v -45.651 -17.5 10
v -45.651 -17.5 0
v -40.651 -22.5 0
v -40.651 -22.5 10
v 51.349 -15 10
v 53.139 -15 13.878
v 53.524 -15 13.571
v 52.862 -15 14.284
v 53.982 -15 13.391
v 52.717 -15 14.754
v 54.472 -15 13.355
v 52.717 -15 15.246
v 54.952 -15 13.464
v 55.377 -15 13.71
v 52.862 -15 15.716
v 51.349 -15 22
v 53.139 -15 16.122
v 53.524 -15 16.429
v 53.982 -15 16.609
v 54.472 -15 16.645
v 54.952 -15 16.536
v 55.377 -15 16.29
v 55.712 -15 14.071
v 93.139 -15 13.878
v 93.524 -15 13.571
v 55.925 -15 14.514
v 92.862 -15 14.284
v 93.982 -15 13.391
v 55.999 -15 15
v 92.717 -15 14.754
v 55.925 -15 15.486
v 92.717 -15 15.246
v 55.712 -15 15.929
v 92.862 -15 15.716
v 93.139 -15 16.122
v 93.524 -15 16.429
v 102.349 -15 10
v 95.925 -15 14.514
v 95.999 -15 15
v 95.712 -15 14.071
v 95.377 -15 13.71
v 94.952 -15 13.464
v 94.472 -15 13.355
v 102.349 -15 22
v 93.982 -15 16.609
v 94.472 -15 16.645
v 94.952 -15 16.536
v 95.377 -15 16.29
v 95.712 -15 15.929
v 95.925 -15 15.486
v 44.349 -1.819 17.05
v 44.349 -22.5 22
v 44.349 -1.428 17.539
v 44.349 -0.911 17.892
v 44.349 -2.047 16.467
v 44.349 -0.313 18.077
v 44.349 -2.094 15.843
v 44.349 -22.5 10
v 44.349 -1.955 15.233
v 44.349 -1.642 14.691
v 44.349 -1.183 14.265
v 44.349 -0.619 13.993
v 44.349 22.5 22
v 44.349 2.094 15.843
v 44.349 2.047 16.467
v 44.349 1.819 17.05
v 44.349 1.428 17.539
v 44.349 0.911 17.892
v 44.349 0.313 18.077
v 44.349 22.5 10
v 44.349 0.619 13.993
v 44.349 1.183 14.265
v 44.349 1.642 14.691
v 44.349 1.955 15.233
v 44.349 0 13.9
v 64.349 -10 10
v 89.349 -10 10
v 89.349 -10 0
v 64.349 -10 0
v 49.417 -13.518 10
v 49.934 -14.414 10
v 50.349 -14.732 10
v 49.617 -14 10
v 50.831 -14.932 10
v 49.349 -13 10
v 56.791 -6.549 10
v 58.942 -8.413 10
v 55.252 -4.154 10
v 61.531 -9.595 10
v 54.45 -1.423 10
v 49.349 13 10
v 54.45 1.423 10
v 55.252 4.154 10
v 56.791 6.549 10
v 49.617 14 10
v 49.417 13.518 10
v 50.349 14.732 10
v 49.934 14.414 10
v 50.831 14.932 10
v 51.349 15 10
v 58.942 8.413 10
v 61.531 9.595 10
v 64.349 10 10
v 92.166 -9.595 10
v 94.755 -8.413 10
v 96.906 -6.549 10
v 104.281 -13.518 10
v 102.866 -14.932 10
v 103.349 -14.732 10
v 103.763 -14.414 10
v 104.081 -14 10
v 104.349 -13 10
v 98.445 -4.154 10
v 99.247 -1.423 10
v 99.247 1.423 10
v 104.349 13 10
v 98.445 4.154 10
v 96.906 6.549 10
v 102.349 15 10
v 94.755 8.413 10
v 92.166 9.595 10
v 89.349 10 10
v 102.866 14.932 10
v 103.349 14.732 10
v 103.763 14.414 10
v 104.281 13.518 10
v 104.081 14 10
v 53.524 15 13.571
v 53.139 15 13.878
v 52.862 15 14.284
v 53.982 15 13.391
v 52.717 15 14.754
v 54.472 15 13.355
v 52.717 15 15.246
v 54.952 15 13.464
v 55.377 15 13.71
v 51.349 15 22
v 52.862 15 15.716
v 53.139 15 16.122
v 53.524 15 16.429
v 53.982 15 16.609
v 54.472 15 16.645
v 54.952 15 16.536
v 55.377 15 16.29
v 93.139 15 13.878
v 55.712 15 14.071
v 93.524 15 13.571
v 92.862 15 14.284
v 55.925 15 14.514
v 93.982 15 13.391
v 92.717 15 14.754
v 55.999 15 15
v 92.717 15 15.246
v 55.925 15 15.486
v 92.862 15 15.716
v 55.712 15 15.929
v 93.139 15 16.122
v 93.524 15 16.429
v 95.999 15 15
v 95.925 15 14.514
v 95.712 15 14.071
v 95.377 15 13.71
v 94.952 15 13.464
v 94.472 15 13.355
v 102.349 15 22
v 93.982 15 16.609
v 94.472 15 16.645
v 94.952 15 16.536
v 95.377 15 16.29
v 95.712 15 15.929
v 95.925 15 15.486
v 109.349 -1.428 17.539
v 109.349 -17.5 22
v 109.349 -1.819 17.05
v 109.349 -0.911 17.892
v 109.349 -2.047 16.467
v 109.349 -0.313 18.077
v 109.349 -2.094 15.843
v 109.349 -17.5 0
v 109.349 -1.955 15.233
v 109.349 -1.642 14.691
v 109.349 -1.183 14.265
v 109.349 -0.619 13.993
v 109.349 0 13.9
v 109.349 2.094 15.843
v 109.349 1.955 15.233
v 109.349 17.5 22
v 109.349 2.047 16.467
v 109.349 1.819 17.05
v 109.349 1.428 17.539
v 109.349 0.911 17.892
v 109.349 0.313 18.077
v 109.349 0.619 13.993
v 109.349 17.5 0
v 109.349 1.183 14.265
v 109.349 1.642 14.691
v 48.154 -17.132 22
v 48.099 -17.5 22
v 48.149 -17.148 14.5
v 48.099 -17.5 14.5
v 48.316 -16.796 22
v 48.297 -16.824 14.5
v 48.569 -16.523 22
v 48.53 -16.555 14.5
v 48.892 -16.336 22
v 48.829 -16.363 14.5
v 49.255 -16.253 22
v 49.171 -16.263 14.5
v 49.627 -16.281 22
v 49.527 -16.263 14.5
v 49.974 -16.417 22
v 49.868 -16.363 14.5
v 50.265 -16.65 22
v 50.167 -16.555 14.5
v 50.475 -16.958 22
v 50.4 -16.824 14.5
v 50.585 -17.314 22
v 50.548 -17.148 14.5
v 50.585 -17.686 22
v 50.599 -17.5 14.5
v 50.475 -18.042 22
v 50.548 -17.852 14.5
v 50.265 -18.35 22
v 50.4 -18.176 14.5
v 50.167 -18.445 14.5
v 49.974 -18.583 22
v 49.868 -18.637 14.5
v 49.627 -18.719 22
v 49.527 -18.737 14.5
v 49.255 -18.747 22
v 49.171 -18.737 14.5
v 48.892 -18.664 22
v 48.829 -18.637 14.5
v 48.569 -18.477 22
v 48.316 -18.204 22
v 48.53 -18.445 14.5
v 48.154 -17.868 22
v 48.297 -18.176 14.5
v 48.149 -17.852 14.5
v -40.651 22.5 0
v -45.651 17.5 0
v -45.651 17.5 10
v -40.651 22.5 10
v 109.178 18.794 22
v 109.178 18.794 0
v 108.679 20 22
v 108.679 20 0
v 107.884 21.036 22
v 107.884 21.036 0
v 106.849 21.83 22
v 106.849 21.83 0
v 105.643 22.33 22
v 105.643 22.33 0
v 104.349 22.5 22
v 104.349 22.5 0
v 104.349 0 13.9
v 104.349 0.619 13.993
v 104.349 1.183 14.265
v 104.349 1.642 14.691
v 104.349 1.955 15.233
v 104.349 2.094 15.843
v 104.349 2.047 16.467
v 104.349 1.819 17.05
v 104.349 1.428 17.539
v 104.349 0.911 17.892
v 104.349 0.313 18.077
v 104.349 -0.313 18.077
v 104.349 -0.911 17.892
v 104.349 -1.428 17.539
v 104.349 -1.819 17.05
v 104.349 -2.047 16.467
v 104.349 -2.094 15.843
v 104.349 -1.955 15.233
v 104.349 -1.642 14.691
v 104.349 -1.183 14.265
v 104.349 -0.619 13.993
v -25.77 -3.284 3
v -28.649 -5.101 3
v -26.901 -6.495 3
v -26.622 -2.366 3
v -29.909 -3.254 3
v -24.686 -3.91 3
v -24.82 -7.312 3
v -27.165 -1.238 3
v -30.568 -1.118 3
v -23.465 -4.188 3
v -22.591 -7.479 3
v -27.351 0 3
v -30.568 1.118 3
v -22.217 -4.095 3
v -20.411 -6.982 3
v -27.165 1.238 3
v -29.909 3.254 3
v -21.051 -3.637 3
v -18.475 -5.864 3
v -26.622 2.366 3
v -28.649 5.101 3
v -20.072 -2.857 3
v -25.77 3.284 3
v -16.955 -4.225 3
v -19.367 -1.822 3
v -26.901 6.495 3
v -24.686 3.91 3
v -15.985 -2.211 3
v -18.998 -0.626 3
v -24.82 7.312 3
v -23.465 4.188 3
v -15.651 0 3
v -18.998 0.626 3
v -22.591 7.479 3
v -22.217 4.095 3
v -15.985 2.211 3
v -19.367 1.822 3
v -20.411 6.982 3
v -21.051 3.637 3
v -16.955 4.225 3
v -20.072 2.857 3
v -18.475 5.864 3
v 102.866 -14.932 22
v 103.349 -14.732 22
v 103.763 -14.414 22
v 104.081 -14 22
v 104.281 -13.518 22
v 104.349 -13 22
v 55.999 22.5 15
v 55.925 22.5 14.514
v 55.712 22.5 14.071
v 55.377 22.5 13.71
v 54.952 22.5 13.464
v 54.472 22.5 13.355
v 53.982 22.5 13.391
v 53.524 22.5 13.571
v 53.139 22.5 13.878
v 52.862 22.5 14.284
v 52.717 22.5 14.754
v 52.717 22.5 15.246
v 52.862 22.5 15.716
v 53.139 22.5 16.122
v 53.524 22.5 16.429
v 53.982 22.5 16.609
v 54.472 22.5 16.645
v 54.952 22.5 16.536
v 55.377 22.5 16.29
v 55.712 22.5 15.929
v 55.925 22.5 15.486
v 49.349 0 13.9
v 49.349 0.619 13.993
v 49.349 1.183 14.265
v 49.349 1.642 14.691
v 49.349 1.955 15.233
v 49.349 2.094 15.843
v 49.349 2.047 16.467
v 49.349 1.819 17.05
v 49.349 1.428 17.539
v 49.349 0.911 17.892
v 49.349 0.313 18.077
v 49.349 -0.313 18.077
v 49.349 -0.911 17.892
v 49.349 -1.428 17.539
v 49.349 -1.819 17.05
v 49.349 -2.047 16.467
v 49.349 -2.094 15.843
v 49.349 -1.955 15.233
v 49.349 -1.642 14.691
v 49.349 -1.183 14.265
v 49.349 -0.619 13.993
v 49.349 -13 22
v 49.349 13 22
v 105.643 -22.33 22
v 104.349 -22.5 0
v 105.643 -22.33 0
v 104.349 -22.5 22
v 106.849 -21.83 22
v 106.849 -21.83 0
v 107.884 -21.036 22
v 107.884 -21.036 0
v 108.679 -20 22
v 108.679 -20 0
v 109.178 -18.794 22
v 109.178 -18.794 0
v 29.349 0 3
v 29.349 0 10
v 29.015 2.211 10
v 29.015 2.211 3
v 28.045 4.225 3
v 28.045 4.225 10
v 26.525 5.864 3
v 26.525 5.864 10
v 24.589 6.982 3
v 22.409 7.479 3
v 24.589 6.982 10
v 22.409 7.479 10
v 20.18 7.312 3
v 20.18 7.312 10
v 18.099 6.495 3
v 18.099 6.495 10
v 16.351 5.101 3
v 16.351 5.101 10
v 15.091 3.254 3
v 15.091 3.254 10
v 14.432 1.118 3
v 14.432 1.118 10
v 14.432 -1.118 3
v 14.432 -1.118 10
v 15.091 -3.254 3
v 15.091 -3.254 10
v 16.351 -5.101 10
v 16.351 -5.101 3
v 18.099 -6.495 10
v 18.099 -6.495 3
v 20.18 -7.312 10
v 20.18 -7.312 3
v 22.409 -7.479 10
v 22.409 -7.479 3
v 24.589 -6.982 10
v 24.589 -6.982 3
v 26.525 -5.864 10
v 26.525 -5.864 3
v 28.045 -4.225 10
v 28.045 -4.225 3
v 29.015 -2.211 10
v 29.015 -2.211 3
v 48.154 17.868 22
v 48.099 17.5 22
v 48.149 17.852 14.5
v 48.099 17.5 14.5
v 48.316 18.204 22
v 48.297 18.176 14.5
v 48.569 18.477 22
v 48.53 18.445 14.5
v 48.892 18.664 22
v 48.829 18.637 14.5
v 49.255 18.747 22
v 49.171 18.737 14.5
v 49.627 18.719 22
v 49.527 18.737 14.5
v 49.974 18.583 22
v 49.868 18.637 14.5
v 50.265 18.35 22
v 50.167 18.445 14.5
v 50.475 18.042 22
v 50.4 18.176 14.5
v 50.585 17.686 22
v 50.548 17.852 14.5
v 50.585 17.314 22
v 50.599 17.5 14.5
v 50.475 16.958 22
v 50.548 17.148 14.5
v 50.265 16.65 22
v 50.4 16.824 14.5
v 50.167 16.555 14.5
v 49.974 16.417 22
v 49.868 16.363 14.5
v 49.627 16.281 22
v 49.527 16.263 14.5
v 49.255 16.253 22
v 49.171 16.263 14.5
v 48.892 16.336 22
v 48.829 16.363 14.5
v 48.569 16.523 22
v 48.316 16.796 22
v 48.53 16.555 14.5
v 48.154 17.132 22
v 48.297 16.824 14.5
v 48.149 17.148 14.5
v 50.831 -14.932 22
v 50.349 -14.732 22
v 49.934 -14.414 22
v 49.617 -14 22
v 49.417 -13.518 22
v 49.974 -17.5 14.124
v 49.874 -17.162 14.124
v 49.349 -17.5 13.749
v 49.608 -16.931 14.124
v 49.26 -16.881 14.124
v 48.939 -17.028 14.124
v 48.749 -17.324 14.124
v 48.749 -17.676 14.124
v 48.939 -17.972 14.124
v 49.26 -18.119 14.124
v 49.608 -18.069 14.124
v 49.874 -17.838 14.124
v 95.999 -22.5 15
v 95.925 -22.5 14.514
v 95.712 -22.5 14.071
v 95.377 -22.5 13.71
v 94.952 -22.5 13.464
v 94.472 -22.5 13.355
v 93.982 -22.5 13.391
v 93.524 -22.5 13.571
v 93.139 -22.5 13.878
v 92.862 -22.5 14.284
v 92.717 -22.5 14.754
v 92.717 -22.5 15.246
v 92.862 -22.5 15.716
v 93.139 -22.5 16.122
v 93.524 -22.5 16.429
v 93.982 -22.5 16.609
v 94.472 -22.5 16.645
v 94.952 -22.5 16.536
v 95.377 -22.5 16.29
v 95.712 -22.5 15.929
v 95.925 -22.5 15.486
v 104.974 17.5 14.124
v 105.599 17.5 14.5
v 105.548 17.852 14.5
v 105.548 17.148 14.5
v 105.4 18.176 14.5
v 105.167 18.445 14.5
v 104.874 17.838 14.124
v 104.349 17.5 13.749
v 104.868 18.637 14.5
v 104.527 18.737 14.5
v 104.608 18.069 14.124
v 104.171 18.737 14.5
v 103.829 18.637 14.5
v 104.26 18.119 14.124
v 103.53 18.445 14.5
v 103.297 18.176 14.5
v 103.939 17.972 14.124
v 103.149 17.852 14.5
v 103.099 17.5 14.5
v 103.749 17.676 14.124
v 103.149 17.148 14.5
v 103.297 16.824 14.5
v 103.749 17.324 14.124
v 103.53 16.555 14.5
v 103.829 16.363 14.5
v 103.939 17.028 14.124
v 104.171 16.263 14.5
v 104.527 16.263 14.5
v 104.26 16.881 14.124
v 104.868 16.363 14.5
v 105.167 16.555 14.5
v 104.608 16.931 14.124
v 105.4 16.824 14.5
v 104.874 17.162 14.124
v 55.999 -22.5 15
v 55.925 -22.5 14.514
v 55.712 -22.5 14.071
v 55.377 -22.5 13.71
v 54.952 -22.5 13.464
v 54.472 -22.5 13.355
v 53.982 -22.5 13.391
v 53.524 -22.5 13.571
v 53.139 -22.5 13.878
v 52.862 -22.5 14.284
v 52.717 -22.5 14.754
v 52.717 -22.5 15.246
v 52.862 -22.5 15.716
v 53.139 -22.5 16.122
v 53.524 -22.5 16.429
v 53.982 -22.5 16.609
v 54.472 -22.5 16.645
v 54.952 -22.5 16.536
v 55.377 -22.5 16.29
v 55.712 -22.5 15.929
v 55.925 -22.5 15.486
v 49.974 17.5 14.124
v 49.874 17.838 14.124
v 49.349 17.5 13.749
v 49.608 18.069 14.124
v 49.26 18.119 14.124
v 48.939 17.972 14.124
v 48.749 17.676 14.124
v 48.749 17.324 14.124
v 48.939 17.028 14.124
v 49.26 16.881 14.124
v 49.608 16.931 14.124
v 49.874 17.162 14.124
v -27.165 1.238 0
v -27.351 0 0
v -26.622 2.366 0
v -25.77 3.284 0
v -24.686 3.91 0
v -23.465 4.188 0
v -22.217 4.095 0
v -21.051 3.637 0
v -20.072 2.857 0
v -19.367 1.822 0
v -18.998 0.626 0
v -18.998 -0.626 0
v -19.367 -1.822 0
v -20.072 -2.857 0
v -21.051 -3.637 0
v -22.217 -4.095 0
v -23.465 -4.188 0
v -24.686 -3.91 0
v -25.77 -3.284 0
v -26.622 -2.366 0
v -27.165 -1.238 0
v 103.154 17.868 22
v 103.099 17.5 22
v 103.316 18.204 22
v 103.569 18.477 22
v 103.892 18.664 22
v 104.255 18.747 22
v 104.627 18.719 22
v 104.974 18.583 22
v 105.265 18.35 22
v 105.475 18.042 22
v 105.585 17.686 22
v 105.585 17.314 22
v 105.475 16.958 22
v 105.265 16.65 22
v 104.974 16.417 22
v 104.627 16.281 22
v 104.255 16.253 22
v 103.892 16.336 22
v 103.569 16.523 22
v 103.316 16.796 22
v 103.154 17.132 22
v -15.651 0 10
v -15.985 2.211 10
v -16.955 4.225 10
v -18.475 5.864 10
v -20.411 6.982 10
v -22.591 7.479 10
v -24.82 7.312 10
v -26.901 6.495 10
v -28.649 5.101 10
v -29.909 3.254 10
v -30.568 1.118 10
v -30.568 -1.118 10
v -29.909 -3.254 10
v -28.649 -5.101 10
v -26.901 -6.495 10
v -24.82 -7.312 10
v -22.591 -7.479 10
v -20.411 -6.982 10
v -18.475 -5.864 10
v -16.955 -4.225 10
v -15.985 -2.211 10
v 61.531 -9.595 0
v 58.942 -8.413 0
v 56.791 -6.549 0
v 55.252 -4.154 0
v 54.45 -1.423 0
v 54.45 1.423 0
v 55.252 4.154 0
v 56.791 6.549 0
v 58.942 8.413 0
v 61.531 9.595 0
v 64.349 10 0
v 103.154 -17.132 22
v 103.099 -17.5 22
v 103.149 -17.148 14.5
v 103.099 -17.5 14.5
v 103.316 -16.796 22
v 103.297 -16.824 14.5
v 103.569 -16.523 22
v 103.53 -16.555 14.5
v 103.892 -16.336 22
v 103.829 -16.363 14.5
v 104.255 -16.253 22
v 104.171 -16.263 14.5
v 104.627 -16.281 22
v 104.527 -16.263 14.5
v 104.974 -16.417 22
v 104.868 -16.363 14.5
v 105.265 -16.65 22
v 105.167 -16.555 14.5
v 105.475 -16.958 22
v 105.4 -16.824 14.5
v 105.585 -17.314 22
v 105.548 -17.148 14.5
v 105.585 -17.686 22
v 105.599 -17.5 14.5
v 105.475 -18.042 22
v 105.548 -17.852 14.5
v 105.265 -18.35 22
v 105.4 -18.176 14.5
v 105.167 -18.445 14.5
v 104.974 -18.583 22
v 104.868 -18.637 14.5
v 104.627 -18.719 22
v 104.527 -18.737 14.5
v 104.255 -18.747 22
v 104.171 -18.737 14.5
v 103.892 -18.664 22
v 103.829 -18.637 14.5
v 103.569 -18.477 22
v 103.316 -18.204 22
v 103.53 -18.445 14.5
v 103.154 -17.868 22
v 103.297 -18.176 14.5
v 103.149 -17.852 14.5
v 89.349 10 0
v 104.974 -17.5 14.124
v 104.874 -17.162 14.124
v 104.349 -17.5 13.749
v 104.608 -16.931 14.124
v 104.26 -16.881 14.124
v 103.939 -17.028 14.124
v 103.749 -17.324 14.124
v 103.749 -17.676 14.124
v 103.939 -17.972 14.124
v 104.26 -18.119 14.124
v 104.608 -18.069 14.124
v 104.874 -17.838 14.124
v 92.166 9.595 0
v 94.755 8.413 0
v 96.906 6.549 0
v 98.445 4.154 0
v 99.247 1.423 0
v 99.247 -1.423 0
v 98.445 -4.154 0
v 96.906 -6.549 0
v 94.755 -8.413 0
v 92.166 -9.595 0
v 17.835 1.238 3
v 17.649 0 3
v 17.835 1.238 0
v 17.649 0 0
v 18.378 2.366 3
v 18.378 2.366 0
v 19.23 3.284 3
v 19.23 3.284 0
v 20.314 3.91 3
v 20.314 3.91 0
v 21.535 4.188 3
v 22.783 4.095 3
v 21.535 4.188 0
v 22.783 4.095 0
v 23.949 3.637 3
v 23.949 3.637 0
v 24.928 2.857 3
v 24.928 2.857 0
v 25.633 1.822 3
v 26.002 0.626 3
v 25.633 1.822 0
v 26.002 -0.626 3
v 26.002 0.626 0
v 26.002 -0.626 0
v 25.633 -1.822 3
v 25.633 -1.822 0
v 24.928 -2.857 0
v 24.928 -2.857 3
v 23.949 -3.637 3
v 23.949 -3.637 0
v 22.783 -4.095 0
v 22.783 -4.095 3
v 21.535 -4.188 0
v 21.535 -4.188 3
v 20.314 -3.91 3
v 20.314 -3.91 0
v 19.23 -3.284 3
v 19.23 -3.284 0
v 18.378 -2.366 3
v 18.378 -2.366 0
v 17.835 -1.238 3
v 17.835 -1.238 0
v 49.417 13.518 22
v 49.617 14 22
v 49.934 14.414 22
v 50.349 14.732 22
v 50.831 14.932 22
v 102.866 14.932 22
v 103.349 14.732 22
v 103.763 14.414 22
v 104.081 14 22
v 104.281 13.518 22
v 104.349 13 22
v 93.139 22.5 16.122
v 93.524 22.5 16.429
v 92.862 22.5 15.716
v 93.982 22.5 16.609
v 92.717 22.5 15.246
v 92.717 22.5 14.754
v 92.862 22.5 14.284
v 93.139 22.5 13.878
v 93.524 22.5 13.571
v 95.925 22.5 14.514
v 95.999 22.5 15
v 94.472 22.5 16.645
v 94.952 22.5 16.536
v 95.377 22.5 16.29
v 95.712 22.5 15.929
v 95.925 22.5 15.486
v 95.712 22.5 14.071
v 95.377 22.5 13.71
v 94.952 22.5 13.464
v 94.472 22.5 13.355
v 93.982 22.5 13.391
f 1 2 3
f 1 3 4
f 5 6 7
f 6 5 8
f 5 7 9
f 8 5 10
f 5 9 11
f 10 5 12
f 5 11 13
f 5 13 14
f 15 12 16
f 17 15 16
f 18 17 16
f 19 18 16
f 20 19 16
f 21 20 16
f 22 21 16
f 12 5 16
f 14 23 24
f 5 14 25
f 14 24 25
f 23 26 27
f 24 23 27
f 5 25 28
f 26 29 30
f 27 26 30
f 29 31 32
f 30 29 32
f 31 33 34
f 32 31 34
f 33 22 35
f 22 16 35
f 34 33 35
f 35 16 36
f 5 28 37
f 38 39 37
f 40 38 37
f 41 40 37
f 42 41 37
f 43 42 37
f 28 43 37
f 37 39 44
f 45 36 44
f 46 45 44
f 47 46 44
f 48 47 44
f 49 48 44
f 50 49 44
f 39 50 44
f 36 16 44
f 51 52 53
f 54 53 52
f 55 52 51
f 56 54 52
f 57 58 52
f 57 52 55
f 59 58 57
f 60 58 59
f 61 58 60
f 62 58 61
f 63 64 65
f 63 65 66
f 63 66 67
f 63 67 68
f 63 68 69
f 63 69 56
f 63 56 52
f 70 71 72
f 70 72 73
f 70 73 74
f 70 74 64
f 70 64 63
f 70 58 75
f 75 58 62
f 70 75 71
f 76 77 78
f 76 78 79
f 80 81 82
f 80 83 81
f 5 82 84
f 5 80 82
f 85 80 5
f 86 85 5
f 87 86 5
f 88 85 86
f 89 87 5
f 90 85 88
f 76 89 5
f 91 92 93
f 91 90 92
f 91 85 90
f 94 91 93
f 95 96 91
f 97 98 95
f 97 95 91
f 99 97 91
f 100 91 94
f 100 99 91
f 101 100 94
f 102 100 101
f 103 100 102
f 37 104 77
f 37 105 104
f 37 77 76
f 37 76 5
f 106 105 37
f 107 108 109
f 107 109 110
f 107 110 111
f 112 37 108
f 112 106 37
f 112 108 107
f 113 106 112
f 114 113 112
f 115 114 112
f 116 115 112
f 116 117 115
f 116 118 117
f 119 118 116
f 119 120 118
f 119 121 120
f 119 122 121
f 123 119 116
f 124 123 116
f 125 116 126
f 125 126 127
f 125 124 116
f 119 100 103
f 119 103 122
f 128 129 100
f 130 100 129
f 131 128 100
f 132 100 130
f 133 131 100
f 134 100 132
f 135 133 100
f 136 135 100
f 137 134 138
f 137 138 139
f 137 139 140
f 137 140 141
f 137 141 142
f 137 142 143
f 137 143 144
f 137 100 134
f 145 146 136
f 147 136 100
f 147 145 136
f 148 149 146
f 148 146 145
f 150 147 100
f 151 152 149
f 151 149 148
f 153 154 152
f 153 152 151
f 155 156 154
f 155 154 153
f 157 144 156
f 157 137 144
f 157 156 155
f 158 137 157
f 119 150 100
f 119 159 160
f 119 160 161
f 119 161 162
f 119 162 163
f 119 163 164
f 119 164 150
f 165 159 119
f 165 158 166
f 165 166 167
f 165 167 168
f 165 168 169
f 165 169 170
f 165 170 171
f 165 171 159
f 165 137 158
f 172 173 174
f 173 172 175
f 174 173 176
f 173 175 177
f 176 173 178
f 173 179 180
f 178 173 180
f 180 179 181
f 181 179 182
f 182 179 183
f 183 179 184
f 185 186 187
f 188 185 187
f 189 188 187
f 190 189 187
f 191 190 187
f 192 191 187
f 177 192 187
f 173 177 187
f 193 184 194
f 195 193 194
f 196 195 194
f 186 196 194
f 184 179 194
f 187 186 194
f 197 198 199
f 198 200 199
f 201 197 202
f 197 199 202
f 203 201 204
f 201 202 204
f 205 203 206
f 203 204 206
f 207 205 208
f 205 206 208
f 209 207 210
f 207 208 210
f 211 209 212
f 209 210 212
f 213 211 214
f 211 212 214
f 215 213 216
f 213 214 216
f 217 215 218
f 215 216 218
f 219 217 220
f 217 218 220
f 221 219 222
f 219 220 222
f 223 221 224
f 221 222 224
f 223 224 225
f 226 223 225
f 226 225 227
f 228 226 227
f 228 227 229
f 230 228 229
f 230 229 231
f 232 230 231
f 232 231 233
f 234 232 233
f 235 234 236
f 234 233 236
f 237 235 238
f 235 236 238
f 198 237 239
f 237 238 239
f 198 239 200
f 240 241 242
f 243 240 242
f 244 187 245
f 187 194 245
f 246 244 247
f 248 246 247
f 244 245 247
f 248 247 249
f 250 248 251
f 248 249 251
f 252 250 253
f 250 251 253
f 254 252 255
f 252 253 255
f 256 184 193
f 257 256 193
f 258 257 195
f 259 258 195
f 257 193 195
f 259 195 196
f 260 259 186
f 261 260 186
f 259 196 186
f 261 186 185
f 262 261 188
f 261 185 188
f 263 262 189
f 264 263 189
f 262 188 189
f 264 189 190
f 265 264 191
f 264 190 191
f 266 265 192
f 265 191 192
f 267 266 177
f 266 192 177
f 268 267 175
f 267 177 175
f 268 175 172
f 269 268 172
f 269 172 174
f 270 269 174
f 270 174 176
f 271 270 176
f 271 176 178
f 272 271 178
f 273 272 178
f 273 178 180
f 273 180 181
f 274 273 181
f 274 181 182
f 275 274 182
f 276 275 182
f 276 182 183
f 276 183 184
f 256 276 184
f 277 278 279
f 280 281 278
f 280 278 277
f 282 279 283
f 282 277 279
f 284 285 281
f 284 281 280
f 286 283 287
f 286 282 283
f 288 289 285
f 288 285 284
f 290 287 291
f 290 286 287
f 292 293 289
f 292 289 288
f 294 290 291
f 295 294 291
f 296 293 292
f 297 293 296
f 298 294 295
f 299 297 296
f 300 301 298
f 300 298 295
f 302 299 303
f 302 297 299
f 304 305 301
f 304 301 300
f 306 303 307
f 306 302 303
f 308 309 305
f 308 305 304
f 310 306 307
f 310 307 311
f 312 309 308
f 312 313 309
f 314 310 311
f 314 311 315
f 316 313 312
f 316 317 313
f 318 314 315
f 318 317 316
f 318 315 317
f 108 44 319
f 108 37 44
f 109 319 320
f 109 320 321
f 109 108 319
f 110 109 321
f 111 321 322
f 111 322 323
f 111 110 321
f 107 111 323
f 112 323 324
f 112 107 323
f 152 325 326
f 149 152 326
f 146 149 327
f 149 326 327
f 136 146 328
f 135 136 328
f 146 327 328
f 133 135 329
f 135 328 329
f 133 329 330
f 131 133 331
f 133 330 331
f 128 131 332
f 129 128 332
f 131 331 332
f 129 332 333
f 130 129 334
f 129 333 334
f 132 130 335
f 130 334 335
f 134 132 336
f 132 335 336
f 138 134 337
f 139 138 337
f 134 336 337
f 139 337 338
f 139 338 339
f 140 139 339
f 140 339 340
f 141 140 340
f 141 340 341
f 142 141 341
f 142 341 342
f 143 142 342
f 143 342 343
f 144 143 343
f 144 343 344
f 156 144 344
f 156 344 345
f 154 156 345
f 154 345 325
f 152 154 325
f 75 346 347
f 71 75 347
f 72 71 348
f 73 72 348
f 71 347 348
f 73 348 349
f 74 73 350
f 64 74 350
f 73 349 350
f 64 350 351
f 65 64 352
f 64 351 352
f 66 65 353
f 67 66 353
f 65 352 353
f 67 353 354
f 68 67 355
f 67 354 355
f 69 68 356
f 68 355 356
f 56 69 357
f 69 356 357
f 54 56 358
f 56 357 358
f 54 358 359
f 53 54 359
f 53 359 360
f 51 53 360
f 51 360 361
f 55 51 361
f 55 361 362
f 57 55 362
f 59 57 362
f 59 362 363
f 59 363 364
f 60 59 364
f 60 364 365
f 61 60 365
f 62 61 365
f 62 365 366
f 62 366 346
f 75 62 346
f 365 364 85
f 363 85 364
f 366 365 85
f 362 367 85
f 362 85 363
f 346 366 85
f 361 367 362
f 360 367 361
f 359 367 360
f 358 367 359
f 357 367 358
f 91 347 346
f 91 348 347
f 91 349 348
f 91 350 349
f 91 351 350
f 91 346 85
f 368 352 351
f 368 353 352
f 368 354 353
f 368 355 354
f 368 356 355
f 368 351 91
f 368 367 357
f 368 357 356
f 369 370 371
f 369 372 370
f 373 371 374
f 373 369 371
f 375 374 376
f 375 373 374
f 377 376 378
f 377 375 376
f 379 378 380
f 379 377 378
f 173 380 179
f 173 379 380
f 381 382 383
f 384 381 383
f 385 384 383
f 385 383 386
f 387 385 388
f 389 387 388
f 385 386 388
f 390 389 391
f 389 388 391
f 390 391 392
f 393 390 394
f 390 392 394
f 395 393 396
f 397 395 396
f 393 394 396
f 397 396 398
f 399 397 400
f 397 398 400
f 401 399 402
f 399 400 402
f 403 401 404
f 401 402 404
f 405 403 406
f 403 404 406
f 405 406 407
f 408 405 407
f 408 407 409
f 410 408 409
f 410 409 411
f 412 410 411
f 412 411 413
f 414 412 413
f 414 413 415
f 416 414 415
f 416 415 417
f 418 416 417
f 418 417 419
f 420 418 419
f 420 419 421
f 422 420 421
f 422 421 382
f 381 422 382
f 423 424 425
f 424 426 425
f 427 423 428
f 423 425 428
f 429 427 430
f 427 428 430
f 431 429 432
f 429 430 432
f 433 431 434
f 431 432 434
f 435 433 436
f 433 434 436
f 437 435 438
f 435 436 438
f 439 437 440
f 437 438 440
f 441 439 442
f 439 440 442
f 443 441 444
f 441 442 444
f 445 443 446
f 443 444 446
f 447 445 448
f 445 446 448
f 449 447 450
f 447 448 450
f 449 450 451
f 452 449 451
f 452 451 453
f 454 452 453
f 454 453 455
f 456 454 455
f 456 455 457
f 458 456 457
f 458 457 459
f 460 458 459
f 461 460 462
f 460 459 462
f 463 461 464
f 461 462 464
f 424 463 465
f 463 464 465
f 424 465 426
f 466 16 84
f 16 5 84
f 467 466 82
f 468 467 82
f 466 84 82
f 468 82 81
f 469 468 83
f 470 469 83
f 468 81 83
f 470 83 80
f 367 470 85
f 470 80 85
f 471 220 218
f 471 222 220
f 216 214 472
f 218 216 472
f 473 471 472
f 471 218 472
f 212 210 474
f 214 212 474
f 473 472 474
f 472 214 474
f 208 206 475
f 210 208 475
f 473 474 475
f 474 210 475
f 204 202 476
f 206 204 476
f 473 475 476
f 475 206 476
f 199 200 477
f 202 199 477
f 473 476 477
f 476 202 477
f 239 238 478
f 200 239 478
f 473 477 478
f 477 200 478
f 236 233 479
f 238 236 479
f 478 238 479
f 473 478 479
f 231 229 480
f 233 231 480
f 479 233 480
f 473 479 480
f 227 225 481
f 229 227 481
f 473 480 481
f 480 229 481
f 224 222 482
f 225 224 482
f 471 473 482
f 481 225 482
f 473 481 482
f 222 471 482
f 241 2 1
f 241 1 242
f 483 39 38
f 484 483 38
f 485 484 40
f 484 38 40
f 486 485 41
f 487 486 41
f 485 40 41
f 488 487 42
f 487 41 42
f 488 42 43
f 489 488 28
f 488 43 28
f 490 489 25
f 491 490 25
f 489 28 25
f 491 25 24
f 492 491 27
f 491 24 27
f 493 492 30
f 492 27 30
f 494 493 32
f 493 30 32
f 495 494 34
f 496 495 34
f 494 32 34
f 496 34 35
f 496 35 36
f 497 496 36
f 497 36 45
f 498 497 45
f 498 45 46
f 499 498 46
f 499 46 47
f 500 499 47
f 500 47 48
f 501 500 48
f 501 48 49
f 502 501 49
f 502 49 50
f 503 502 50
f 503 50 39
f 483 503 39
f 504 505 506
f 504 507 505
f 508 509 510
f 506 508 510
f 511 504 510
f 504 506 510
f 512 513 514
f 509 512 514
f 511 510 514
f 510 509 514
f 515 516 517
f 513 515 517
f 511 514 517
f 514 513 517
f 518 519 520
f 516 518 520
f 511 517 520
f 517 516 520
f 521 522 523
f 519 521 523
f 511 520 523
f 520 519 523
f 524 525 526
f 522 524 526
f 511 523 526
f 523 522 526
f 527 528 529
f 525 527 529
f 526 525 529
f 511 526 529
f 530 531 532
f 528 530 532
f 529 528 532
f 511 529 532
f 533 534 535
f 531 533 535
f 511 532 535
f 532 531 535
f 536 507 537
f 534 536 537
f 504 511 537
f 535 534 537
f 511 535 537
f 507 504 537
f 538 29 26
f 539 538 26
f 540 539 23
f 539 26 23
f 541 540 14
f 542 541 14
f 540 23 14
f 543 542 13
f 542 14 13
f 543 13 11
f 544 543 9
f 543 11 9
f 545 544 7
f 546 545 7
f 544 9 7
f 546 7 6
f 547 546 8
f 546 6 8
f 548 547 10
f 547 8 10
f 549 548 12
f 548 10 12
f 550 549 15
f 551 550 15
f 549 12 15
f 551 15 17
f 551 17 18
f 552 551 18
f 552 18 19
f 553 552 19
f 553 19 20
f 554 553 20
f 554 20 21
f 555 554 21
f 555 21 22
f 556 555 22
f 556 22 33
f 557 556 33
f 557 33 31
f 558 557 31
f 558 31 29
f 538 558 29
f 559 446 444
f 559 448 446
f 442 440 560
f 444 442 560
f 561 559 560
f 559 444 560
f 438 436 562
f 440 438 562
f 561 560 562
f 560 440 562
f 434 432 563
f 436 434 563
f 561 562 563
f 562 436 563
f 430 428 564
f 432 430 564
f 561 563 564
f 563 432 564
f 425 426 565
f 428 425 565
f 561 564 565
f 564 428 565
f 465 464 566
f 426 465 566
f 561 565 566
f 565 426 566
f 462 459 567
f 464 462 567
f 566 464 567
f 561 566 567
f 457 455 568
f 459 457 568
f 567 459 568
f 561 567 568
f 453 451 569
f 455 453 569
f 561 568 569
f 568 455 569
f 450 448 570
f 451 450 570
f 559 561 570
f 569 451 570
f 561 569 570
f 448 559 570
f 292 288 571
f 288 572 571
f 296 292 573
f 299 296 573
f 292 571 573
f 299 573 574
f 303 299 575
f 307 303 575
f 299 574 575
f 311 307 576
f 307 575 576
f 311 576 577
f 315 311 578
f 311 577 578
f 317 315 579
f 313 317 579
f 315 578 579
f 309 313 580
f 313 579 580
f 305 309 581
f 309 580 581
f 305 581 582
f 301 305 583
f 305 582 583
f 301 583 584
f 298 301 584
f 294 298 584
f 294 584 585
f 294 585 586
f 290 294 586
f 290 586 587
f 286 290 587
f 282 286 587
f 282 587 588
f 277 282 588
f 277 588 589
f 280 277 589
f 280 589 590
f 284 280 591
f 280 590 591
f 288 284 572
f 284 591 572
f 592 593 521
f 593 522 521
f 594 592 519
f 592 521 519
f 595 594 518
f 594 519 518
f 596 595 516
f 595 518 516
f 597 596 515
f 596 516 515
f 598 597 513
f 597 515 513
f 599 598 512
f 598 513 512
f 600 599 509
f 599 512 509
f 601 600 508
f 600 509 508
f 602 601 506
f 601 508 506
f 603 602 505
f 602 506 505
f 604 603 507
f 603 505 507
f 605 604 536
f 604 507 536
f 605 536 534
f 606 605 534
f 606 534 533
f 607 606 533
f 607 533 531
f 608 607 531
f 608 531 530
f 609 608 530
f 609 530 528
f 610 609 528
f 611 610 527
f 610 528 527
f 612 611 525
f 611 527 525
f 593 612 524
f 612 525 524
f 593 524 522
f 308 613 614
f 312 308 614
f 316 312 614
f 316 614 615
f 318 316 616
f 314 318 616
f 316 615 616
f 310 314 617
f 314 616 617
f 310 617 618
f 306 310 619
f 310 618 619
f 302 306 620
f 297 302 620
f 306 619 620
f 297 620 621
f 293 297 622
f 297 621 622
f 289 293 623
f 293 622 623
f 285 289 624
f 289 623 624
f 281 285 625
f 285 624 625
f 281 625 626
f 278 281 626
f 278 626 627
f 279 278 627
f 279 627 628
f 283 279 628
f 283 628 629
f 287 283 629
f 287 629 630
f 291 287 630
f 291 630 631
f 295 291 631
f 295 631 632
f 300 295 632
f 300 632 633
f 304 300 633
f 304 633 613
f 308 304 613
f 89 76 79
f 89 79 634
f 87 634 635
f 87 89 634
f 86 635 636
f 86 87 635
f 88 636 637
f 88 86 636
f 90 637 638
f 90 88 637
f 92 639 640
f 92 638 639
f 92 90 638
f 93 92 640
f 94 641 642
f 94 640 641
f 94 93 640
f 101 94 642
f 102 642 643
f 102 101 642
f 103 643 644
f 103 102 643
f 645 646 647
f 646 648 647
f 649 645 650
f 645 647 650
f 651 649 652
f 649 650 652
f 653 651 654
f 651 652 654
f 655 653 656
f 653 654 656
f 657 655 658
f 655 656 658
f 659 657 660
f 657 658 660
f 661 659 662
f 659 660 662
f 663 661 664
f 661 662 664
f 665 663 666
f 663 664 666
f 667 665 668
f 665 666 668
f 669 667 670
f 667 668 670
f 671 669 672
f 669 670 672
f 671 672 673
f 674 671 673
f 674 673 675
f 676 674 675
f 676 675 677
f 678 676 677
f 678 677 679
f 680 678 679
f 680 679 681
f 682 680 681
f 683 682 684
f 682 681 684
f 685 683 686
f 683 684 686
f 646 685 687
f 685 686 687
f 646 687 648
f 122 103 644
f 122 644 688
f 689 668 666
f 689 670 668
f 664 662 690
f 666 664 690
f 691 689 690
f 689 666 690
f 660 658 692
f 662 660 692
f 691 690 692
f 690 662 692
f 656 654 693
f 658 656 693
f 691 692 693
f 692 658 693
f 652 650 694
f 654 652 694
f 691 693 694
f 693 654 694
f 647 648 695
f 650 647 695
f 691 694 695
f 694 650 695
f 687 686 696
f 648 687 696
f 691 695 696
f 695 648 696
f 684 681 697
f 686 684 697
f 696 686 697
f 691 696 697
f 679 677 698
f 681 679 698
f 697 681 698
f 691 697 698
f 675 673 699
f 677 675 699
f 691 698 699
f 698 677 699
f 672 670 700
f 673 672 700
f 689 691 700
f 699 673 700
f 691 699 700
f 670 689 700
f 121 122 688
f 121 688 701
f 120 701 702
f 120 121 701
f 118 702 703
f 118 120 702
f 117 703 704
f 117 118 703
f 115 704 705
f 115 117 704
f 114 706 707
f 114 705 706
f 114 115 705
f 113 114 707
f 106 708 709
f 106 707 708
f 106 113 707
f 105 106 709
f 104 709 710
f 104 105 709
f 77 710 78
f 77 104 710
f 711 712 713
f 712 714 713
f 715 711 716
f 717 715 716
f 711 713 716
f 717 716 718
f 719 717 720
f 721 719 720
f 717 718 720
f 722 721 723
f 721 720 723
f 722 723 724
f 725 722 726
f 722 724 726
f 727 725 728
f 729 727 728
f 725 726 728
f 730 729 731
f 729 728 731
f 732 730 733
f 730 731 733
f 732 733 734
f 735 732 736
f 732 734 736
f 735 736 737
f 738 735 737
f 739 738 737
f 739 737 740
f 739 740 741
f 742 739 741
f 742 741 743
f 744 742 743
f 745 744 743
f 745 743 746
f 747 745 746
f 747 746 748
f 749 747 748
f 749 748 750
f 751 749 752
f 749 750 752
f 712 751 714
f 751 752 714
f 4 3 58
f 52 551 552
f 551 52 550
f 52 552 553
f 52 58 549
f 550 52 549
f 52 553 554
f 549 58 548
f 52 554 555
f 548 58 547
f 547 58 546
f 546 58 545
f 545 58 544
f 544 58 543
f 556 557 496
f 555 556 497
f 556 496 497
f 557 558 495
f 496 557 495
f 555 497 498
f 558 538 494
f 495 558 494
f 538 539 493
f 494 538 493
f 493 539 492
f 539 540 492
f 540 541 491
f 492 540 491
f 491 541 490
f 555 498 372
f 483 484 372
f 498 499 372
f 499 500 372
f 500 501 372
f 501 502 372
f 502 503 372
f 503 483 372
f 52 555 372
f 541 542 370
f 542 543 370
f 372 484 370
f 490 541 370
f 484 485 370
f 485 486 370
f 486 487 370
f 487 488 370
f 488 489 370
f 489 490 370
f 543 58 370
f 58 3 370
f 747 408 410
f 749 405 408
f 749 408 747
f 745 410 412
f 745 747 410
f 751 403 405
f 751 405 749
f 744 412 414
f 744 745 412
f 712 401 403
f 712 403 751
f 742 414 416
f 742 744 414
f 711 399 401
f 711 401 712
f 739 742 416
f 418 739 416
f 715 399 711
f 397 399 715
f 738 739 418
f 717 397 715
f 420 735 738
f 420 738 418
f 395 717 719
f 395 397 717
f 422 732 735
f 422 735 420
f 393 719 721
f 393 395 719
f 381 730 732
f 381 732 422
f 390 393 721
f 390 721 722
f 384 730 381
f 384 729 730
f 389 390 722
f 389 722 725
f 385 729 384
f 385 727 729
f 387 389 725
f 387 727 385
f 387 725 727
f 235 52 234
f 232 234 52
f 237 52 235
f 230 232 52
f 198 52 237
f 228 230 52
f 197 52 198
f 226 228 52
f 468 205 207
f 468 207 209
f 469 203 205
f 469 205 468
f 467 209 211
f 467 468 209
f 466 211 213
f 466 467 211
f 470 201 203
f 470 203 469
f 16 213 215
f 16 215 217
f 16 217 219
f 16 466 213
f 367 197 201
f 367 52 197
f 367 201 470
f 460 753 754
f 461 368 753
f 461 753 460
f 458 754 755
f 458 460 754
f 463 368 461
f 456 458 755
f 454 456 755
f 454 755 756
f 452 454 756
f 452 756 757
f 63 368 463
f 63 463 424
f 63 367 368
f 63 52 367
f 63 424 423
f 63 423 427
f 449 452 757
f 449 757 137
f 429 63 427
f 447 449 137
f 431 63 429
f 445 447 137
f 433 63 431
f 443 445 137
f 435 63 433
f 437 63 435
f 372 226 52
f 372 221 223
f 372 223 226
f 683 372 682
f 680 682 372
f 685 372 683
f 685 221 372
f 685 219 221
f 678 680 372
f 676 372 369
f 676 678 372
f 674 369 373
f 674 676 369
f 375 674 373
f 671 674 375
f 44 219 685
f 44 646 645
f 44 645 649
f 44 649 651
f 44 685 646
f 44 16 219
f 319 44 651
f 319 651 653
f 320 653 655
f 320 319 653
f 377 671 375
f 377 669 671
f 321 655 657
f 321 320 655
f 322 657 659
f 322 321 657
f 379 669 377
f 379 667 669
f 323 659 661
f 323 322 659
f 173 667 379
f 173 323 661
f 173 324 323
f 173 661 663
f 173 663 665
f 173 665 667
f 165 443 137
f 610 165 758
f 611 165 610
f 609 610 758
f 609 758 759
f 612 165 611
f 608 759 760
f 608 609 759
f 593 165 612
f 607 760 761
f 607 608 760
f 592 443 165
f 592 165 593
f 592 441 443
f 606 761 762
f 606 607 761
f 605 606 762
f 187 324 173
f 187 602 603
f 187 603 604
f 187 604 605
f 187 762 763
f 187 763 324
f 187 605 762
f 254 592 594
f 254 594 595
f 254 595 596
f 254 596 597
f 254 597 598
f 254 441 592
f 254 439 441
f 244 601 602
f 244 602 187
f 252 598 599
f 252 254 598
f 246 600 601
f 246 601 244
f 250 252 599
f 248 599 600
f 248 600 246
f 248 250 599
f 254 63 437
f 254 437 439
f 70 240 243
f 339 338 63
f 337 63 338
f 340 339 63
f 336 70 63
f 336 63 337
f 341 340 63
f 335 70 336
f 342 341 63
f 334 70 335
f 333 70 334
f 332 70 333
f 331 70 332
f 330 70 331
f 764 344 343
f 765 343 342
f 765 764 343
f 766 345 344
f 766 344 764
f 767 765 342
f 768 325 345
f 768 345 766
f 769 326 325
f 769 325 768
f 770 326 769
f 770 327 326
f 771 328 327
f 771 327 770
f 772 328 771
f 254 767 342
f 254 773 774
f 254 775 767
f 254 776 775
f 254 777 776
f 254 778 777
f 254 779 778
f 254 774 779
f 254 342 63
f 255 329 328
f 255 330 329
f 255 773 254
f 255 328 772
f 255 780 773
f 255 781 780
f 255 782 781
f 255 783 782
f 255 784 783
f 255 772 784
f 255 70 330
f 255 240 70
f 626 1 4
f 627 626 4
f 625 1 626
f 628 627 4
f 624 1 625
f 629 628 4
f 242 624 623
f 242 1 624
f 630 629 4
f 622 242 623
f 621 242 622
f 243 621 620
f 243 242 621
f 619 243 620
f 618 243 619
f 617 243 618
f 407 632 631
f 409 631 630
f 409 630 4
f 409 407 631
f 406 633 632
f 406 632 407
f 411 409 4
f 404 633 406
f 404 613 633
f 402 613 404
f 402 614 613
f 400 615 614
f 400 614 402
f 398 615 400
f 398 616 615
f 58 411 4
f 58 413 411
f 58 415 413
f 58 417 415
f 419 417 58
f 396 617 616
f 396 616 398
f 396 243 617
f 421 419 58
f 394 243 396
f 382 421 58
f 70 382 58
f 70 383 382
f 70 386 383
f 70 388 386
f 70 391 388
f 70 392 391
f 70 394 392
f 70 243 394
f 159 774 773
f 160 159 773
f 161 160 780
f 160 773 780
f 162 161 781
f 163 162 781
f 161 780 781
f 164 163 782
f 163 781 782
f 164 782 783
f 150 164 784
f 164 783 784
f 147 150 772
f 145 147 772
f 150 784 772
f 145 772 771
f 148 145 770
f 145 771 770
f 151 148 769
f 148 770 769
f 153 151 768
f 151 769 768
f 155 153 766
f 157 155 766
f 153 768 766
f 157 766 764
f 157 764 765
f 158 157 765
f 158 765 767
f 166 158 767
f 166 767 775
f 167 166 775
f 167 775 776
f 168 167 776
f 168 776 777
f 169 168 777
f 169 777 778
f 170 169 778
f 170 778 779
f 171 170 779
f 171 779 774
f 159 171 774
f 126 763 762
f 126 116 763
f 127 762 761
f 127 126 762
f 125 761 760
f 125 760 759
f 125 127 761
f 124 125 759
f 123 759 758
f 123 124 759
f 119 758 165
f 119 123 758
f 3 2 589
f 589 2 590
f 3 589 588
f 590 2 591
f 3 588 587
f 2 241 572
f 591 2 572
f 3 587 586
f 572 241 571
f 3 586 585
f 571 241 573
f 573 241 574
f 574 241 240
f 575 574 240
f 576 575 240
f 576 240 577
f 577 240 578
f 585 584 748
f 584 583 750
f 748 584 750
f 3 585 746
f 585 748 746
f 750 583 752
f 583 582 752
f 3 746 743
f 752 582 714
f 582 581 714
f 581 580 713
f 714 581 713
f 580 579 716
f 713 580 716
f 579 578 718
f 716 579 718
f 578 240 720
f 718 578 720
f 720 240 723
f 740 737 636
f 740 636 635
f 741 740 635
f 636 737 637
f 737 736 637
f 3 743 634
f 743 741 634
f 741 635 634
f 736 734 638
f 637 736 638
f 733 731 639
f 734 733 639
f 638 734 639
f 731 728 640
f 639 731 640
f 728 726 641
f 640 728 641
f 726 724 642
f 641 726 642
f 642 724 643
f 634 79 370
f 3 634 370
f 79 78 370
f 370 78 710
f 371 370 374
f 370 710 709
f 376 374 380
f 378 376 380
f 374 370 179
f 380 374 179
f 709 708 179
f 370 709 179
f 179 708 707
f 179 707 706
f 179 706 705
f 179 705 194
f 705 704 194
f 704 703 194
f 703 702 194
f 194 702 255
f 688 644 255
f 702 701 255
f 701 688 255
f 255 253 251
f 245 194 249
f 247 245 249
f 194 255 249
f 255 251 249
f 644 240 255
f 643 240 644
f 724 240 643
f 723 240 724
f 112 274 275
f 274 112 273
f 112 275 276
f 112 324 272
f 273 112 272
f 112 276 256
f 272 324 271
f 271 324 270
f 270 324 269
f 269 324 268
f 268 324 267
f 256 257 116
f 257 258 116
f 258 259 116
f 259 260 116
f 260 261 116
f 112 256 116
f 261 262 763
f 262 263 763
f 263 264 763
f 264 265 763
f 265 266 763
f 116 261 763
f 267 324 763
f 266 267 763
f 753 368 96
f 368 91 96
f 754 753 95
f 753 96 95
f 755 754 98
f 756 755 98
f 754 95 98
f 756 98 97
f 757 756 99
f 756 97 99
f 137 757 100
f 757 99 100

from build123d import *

# Parameters (mm, degrees)
SKETCH1_W                 = 155
SKETCH1_H                 = 45
BOSS_EXTRUDE1_DEPTH       = 10
SKETCH2_W                 = 65
SKETCH2_H                 = 45
BOSS_EXTRUDE2_DEPTH       = 12
CUT_EXTRUDE1_DEPTH        = 59
SKETCH4_W                 = 55
SKETCH4_H                 = 30
CUT_EXTRUDE2_DEPTH        = 12
M5_TAPPED_HOLE1_D         = 4.2
M3_TAPPED_HOLE1_D         = 2.5
M3_TAPPED_HOLE1_DEPTH     = 7.5
M3_TAPPED_HOLE1_TIP       = 0.751075774
HOLE_WIZARD_M4_1_D        = 3.3
CHAMFER1_SIZE             = 5
FILLET_1_R                = 5
FILLET_2_R                = 2
HOLE_WIZARD_1_D           = 8.4
HOLE_WIZARD_1_CBORE_D     = 15
HOLE_WIZARD_1_CBORE_DEPTH = 7


with BuildPart() as part:
    # Sketch1 → Boss-Extrude1 (new body)
    with BuildSketch(Plane.XY):
        with Locations((31.848694107, 0)):
            Rectangle(SKETCH1_W, SKETCH1_H)
    extrude(amount=BOSS_EXTRUDE1_DEPTH)

    # Sketch2 → Boss-Extrude2 (add)
    with BuildSketch(Plane.XY.offset(10)):
        with Locations((76.848694107, 0)):
            Rectangle(SKETCH2_W, SKETCH2_H)
    extrude(amount=BOSS_EXTRUDE2_DEPTH)

    # Sketch3 → Cut-Extrude1 (cut)
    with BuildSketch(Plane.XY.offset(22)):
        with BuildLine():
            Line((64.348694107, 10), (89.348694107, 10))
            ThreePointArc((89.348694107, 10), (99.348694107, 0), (89.348694107, -10))
            Line((89.348694107, -10), (64.348694107, -10))
            ThreePointArc((64.348694107, -10), (54.348694107, 0), (64.348694107, 10))
        make_face()
    extrude(amount=-CUT_EXTRUDE1_DEPTH, mode=Mode.SUBTRACT)

    # Sketch4 → Cut-Extrude2 (cut)
    with BuildSketch(Plane.XY.offset(22)):
        with Locations((76.848694107, 0)):
            Rectangle(SKETCH4_W, SKETCH4_H)
    extrude(amount=-CUT_EXTRUDE2_DEPTH, mode=Mode.SUBTRACT)

    # M5 Tapped Hole1 (through all)
    with Locations(Plane.ZY.offset(-44.348694107)):
        with Locations((16, 0)):
            Hole(M5_TAPPED_HOLE1_D / 2)

    # M3 Tapped Hole1
    with Locations(Plane.XY.offset(22)):
        with Locations((104.348694107, -17.5), (104.348694107, 17.5), (49.348694107, -17.5), (49.348694107, 17.5)):
            Hole(M3_TAPPED_HOLE1_D / 2, depth=M3_TAPPED_HOLE1_DEPTH)
            with Locations((0, 0, -(M3_TAPPED_HOLE1_DEPTH + M3_TAPPED_HOLE1_TIP / 2))):  # 118° drill point
                Cone(0, M3_TAPPED_HOLE1_D / 2, M3_TAPPED_HOLE1_TIP, mode=Mode.SUBTRACT)

    # M4 螺纹孔1 (through all)
    with Locations(Plane(origin=(0, -22.5, 0), x_dir=(-1, 0, 0), z_dir=(0, -1, 0))):
        with Locations((-94.348694107, -15), (-54.348694107, -15)):
            Hole(HOLE_WIZARD_M4_1_D / 2)

    # Chamfer1
    chamfer1_edges = [part.edges().sort_by_distance(p)[0] for p in [
        (-45.651305893, -22.5, 5),
        (-45.651305893, 22.5, 5),
    ]]
    chamfer(chamfer1_edges, length=CHAMFER1_SIZE)

    # 圆角1
    fillet_1_edges = [part.edges().sort_by_distance(p)[0] for p in [
        (109.348694107, 22.5, 11),
        (109.348694107, -22.5, 11),
    ]]
    fillet(fillet_1_edges, radius=FILLET_1_R)

    # 圆角2
    fillet_2_edges = [part.edges().sort_by_distance(p)[0] for p in [
        (49.348694107, -15, 16),
        (49.348694107, 15, 16),
        (104.348694107, 15, 16),
        (104.348694107, -15, 16),
    ]]
    fillet(fillet_2_edges, radius=FILLET_2_R)

    # 打孔尺寸(%根据)内六角圆柱头螺钉的类型1 (through all)
    with Locations(Plane.XY.offset(10)):
        with Locations((21.848694107, 0), (-23.151305893, 0)):
            CounterBoreHole(HOLE_WIZARD_1_D / 2, HOLE_WIZARD_1_CBORE_D / 2, HOLE_WIZARD_1_CBORE_DEPTH)


solid = part.part
